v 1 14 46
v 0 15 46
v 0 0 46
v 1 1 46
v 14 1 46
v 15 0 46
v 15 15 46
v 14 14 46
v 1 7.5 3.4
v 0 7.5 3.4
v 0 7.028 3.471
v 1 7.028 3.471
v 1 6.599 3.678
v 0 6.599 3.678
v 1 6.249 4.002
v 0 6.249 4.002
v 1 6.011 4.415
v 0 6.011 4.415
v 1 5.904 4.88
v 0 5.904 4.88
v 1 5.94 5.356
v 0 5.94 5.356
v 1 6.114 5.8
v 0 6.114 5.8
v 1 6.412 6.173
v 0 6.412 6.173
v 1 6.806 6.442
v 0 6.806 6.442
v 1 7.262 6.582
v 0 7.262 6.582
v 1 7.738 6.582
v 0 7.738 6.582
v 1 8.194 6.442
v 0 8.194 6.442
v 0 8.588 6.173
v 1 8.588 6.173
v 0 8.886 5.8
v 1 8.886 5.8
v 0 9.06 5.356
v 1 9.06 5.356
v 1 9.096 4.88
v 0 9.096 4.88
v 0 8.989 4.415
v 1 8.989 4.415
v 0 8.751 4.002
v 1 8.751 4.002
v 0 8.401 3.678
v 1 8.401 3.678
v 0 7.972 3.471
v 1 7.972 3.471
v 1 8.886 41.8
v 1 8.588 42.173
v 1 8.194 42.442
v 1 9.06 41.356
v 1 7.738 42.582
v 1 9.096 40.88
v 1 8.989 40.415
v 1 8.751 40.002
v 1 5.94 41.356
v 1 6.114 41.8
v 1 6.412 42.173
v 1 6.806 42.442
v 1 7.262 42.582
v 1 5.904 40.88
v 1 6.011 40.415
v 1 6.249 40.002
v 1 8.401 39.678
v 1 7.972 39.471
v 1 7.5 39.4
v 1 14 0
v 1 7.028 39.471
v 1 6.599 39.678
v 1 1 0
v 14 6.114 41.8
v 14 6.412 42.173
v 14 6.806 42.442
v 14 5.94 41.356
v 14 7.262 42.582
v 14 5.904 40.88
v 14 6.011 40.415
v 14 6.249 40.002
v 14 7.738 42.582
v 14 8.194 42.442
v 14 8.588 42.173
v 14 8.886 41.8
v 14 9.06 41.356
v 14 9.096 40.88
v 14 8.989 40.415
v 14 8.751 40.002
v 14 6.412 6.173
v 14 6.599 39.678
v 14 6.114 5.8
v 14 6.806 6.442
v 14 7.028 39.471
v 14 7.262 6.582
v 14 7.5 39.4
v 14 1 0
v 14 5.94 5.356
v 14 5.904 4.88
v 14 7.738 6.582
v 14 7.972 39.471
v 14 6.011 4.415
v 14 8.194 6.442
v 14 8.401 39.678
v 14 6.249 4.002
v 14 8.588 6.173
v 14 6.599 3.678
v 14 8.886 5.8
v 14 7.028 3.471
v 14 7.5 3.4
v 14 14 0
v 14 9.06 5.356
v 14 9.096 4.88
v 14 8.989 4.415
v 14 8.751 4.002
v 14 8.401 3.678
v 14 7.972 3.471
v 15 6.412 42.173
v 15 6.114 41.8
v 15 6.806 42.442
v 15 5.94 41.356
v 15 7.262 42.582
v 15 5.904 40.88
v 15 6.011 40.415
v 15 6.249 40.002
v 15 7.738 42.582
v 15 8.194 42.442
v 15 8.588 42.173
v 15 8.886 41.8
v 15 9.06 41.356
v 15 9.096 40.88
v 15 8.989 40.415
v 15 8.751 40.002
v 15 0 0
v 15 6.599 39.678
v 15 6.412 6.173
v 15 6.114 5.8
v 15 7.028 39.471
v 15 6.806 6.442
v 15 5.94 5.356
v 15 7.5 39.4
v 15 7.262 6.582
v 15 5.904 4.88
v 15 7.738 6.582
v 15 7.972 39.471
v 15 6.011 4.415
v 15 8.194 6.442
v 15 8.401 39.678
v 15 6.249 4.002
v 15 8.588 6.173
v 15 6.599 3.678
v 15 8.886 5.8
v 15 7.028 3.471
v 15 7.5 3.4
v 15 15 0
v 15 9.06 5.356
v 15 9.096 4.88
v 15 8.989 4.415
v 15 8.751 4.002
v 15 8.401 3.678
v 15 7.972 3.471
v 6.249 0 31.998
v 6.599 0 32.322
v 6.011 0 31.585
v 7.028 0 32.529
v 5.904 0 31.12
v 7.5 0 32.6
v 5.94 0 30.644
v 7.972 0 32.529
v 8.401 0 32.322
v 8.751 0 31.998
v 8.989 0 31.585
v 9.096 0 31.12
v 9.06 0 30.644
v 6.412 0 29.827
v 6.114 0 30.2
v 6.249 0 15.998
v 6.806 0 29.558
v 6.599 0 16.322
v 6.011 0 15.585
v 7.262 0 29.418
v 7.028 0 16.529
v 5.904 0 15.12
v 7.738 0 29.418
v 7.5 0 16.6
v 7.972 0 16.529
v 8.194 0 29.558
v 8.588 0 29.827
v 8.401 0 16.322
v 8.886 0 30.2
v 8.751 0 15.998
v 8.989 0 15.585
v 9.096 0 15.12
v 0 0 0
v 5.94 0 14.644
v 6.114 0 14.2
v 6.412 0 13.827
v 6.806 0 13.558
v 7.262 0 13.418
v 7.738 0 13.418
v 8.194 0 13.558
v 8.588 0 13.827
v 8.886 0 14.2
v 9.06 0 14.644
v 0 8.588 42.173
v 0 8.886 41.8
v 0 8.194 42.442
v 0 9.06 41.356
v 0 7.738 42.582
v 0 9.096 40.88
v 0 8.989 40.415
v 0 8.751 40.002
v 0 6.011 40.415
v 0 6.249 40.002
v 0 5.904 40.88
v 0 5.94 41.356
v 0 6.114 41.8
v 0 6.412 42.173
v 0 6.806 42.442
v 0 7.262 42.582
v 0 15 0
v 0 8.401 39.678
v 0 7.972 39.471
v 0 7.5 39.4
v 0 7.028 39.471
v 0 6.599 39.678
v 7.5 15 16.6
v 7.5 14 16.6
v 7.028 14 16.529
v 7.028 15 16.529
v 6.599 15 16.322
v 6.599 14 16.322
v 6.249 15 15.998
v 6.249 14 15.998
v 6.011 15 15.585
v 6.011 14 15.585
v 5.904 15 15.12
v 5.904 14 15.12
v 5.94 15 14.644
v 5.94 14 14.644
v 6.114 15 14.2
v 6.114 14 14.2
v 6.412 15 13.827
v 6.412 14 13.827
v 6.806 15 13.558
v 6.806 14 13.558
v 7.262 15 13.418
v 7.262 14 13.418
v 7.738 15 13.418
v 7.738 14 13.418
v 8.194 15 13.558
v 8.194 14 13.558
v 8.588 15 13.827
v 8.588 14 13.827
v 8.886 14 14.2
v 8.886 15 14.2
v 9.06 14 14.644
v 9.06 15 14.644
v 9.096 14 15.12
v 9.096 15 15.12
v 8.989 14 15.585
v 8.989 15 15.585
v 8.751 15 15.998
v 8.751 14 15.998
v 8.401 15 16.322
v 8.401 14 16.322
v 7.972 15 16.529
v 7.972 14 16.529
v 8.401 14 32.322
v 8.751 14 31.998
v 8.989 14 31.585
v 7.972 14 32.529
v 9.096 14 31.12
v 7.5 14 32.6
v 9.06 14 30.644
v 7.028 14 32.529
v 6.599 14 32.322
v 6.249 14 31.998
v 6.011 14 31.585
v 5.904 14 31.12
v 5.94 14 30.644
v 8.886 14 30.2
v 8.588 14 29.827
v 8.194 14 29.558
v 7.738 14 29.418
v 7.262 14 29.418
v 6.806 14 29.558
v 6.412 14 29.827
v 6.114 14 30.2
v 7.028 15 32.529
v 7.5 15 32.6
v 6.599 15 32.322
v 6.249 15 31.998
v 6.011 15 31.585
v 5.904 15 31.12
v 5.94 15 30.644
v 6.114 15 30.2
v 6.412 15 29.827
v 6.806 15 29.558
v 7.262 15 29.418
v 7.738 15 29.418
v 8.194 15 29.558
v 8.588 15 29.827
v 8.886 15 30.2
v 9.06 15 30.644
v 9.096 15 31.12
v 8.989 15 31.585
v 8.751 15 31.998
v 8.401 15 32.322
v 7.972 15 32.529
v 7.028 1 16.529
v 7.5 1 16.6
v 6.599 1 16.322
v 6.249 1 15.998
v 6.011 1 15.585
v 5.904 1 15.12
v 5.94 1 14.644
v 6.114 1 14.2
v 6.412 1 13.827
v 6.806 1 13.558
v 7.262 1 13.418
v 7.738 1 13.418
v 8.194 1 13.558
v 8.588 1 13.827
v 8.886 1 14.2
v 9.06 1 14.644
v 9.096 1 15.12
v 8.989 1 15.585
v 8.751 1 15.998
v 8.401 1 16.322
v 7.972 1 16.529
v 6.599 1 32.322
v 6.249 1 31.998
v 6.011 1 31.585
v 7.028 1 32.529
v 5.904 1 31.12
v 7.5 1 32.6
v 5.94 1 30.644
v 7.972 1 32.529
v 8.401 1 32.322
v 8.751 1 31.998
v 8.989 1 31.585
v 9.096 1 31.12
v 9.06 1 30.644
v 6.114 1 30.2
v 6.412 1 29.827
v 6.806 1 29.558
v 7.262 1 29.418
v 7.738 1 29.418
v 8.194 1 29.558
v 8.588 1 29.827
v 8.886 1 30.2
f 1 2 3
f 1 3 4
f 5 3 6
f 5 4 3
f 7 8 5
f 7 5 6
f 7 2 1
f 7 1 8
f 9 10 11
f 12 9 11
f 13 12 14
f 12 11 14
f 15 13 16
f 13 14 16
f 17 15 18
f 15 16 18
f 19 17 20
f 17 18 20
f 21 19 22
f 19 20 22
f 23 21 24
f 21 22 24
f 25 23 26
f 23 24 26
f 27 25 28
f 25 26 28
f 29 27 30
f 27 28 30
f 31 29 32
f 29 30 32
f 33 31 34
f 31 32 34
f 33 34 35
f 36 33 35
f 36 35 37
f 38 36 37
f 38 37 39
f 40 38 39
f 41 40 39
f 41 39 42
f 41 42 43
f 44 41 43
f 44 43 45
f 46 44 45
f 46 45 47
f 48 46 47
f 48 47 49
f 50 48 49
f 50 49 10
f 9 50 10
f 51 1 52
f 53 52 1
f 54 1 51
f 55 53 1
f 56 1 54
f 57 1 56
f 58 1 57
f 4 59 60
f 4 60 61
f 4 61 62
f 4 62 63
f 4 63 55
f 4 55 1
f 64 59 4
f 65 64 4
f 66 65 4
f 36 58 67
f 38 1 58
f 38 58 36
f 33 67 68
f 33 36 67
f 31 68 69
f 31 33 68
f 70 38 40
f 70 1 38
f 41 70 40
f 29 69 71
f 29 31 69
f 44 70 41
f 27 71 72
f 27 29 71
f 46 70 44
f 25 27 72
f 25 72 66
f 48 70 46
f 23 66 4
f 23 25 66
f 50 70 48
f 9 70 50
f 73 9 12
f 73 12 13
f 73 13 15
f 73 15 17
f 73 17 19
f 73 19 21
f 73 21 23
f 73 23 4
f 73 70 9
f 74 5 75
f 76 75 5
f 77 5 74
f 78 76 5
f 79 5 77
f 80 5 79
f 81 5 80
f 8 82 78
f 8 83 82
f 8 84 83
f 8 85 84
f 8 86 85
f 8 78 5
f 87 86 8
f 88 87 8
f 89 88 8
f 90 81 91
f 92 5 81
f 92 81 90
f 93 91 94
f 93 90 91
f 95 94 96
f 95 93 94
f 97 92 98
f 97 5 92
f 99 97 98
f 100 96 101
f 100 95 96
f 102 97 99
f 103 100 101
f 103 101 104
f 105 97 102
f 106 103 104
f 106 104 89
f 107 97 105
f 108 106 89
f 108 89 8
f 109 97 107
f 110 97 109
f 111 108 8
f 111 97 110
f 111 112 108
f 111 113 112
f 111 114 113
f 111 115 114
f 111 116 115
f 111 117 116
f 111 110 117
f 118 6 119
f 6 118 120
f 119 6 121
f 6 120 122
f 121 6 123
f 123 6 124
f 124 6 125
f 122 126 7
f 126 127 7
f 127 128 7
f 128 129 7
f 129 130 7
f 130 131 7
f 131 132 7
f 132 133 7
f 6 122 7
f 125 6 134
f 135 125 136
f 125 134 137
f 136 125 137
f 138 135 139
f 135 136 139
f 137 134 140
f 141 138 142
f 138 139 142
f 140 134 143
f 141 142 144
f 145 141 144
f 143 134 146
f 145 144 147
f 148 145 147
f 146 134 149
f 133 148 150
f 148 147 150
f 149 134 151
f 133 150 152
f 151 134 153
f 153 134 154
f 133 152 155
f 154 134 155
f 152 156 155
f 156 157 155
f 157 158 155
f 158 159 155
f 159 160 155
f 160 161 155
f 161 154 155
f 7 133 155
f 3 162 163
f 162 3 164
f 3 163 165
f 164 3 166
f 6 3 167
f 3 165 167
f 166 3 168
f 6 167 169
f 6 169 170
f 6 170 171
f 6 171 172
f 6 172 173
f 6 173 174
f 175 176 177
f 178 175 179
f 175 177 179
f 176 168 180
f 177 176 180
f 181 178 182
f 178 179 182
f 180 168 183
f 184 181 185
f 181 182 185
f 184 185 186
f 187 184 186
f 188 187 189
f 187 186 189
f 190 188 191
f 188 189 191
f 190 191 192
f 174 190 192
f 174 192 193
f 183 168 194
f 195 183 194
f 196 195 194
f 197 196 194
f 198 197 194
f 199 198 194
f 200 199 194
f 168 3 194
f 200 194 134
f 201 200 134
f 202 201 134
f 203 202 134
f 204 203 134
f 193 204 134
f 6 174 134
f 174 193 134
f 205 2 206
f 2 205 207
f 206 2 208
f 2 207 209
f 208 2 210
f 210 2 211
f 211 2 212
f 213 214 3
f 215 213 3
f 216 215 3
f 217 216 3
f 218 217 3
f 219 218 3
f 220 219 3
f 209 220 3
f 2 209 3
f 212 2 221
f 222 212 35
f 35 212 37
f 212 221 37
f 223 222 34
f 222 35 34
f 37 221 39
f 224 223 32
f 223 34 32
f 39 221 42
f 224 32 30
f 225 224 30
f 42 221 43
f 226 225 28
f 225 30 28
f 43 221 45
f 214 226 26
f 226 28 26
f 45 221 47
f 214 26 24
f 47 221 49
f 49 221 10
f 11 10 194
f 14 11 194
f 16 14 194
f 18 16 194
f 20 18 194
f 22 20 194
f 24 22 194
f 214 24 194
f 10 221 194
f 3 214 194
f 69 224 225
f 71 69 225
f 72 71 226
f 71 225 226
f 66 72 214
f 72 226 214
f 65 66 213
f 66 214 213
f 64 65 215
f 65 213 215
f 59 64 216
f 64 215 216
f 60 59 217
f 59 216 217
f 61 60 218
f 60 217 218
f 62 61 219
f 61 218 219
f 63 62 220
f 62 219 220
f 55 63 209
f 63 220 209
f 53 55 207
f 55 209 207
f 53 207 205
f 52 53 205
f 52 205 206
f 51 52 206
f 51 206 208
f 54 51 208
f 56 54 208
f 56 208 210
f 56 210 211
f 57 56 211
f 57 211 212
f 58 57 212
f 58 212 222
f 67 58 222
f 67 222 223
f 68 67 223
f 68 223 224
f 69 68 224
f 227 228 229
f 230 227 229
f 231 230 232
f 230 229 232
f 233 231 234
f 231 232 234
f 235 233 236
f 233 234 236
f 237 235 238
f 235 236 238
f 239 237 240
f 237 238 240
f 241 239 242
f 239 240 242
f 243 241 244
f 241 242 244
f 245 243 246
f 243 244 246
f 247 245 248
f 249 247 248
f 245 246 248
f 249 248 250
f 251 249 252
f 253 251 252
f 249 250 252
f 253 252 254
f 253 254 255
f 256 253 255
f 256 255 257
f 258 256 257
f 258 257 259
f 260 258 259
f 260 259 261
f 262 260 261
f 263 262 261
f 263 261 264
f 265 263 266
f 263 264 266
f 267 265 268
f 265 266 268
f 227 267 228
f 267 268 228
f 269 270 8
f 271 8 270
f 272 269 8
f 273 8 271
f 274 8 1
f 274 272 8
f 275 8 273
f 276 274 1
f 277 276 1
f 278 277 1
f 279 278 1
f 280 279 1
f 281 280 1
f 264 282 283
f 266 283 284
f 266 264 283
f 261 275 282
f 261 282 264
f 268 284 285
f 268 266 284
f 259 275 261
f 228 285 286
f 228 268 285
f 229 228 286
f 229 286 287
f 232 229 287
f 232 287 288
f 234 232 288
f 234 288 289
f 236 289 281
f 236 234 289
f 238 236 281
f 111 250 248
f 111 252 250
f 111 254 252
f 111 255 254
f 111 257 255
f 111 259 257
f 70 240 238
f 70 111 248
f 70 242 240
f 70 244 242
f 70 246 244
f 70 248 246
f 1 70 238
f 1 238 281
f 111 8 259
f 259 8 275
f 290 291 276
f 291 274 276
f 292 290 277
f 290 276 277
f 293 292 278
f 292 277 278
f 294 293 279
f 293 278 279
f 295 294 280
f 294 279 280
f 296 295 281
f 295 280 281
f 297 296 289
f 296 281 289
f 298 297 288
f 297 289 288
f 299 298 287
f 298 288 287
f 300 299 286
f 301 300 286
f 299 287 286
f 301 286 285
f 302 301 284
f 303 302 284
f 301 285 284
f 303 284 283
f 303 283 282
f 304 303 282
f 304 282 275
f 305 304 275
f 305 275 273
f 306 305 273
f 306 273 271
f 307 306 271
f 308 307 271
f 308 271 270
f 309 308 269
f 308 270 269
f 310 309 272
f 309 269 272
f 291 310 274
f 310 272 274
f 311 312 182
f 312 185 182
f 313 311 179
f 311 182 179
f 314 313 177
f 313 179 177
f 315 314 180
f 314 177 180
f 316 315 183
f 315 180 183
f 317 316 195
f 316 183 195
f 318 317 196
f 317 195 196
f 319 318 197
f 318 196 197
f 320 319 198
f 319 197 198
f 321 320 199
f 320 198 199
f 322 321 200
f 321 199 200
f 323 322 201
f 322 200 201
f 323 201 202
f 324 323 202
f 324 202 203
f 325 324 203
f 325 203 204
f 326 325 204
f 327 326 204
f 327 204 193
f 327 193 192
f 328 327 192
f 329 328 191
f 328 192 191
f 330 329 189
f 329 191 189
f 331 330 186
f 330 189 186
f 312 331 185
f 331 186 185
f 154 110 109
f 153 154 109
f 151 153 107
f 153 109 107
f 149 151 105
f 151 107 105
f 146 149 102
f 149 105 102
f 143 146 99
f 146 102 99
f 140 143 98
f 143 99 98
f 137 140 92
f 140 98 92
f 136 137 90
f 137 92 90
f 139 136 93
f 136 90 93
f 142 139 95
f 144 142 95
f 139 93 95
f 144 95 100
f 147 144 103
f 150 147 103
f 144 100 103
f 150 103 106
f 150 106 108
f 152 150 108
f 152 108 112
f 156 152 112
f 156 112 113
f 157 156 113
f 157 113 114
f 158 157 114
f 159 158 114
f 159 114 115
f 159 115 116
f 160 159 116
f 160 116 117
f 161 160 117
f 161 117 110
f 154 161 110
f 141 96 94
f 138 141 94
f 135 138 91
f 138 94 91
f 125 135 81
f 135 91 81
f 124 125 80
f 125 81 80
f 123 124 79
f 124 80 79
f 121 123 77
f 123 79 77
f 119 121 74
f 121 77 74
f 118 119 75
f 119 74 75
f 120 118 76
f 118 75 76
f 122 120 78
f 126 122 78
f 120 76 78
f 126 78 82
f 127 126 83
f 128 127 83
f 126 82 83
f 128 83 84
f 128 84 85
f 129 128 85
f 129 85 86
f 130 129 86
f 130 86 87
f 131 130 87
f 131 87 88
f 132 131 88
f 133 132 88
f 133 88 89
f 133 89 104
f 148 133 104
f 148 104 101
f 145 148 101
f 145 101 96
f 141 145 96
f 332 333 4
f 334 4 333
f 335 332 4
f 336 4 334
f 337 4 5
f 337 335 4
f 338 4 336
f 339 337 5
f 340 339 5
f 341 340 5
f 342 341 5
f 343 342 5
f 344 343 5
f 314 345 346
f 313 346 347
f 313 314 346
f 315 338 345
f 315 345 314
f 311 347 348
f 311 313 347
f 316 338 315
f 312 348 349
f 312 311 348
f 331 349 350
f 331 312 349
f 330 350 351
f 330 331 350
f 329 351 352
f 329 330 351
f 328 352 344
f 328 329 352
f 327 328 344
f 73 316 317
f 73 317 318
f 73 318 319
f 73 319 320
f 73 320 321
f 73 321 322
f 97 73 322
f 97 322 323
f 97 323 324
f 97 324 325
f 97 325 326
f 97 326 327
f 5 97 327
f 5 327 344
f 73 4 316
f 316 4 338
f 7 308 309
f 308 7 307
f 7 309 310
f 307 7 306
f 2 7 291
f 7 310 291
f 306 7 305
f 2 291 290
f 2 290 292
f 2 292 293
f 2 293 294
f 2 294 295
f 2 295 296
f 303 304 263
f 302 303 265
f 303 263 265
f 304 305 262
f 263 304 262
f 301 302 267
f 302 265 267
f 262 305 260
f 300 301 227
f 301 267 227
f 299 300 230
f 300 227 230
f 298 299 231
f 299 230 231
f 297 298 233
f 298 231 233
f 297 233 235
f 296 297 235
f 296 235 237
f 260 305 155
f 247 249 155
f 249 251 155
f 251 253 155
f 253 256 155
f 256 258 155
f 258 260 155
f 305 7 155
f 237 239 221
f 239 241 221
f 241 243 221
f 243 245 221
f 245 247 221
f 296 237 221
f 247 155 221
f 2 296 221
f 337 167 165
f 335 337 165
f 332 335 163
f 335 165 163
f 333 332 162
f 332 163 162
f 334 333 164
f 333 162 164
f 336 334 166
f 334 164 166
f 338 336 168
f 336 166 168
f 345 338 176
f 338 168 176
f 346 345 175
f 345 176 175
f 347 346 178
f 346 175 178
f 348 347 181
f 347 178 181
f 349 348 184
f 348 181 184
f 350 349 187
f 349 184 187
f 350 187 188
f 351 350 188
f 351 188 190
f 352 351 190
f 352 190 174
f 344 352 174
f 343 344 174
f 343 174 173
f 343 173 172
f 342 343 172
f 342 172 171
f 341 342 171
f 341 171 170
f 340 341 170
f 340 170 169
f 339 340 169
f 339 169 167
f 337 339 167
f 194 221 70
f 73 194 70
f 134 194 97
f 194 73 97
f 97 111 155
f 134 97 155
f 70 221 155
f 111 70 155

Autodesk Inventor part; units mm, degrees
ref_plane "YZ Plane" through (0, 0, 0) normal (1, 0, 0) x (0, 1, 0)
ref_plane "XZ Plane" through (0, 0, 0) normal (0, 1, 0) x (-1, 0, 0)
ref_plane "XY Plane" through (0, 0, 0) normal (0, 0, 1) x (1, 0, 0)
sketch "スケッチ1" plane through (0, 0, 0) normal (0, 0, 1) x (1, 0, 0)
  line L0 (0, 0) -> (15, 0)
  line L1 (15, 0) -> (15, 15)
  line L2 (15, 15) -> (0, 15)
  line L3 (0, 15) -> (0, 0)
  line L4 (1, 1) -> (14, 1)
  line L5 (14, 1) -> (14, 14)
  line L6 (14, 14) -> (1, 14)
  line L7 (1, 14) -> (1, 1)
  dimension "d0" = 15
  dimension "d1" = 15
  dimension "d2" = 13
  dimension "d3" = 13
  dimension "d4" = 1
  dimension "d5" = 1
extrude "押し出し1" add sketch "スケッチ1" along normal blind 46
sketch "スケッチ2" plane through (15, 0, 0) normal (1, 0, 0) x (0, 0, -1)
  circle A0 centre (-5, 7.5) radius 1.6
  line L0 (0, 0) -> (-46, 0) projected
  line L1 (0, 0) -> (0, 15) projected
  circle A1 centre (-41, 7.5) radius 1.6
  line L2 (-46, 0) -> (-46, 15) projected
  dimension "d8" = 3.2
  dimension "d9" = 7.5
  dimension "d10" = 5
  dimension "d11" = 3.2
  dimension "d12" = 5
hole "穴1" at (15, 7.5, 41) at (15, 7.5, 5) direction (-1, 0, 0) diameter 3.2 depth 15
sketch "スケッチ3" plane through (0, 15, 0) normal (0, 1, 0) x (1, 0, 0)
  circle A0 centre (7.5, -15) radius 1.6
  line L0 (15, 0) -> (15, -46) projected
  line L1 (15, 0) -> (0, 0) projected
  circle A1 centre (7.5, -31) radius 1.6
  line L2 (15, -46) -> (0, -46) projected
  dimension "d20" = 3.2
  dimension "d21" = 7.5
  dimension "d22" = 15
  dimension "d23" = 3.2
  dimension "d24" = 15
hole "穴2" at (7.5, 15, 31) at (7.5, 15, 15) direction (0, -1, 0) diameter 3.2 depth 15
equation "\"BendRadius\" = Thickness"
equation "\"BendReliefWidth\" = Thickness"
equation "\"BendReliefDepth\" = 0.5 * Thickness"
equation "\"CornerReliefSize\" = 4 * Thickness"
equation "\"MinimumRemnant\" = 2 * Thickness"
equation "\"TransitionRadius\" = BendRadius"
equation "\"JacobiRadiusSize\" = BendRadius"
equation "\"GapSize\" = Thickness"
equation "\"Thickness\" = 0.5"
properties part number "nhk29"
